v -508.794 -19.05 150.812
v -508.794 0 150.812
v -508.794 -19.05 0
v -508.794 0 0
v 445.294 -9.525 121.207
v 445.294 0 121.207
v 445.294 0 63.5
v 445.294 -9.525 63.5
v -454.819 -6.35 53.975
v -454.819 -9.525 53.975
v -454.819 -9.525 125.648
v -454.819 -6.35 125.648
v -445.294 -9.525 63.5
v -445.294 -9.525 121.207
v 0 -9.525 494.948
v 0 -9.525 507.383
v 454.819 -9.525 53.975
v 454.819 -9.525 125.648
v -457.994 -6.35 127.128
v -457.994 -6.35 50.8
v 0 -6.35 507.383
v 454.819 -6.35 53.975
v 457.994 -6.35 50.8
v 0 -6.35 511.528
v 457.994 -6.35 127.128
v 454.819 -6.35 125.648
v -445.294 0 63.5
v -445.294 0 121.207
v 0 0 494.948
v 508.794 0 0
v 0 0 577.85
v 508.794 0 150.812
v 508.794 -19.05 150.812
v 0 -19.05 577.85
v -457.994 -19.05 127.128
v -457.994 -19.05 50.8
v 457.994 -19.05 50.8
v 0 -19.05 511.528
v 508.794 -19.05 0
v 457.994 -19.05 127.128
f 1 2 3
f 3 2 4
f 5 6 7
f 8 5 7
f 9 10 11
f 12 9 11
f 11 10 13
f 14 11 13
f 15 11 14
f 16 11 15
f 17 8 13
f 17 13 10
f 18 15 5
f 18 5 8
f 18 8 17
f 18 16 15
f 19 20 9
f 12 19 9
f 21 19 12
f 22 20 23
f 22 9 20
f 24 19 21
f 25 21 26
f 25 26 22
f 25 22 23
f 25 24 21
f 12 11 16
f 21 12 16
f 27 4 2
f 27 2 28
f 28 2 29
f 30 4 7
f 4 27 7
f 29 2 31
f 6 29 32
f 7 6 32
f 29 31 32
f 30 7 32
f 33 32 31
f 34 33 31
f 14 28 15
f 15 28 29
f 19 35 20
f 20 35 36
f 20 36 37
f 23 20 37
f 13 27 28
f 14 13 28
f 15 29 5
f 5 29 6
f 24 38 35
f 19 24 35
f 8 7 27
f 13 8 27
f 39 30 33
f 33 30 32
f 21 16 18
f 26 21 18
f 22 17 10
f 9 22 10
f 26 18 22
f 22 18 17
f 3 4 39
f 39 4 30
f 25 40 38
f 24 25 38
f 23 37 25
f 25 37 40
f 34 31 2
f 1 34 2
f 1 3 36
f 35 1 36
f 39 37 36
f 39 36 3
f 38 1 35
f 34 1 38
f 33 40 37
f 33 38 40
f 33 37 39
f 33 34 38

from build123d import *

# Parameters (mm, degrees)
F1_DEPTH = 19.05
F4_DEPTH = 9.525
F6_DEPTH = 3.175


with BuildPart() as f1:
    # F0 (on Front) → F1 (new body)
    with BuildSketch(Plane.XZ):
        Polygon((-508.79375, 0), (0, 0), (508.79375, 0), (508.79375, 150.8125), (0, 577.85), (-508.79375, 150.8125), align=None)
        Polygon((0, 63.5), (-445.29375, 63.5), (-445.29375, 121.206816), (0, 494.947904), (445.29375, 121.206816), (445.29375, 63.5), align=None, mode=Mode.SUBTRACT)
    extrude(amount=F1_DEPTH)

    # F3 (on face) → F4 (cut)
    with BuildSketch(Plane.XZ.offset(19.05)):
        Polygon((457.99375, 50.8), (457.99375, 127.127953), (0, 511.528323), (-457.99375, 127.127953), (-457.99375, 50.8), align=None)
        Polygon((-445.29375, 63.5), (-445.29375, 121.206816), (0, 494.947904), (445.29375, 121.206816), (445.29375, 63.5), align=None, mode=Mode.SUBTRACT)
    extrude(amount=-F4_DEPTH, mode=Mode.SUBTRACT)

    # F5 (on face) → F6 (cut)
    with BuildSketch(Plane.XZ.offset(9.525)):
        Polygon((0, 511.528323), (-457.99375, 127.127953), (-457.99375, 50.8), (457.99375, 50.8), (457.99375, 127.127953), align=None)
        Polygon((0, 507.383218), (454.81875, 125.647669), (454.81875, 53.975), (-454.81875, 53.975), (-454.81875, 125.647669), align=None, mode=Mode.SUBTRACT)
    extrude(amount=-F6_DEPTH, mode=Mode.SUBTRACT)


solid = f1.part
